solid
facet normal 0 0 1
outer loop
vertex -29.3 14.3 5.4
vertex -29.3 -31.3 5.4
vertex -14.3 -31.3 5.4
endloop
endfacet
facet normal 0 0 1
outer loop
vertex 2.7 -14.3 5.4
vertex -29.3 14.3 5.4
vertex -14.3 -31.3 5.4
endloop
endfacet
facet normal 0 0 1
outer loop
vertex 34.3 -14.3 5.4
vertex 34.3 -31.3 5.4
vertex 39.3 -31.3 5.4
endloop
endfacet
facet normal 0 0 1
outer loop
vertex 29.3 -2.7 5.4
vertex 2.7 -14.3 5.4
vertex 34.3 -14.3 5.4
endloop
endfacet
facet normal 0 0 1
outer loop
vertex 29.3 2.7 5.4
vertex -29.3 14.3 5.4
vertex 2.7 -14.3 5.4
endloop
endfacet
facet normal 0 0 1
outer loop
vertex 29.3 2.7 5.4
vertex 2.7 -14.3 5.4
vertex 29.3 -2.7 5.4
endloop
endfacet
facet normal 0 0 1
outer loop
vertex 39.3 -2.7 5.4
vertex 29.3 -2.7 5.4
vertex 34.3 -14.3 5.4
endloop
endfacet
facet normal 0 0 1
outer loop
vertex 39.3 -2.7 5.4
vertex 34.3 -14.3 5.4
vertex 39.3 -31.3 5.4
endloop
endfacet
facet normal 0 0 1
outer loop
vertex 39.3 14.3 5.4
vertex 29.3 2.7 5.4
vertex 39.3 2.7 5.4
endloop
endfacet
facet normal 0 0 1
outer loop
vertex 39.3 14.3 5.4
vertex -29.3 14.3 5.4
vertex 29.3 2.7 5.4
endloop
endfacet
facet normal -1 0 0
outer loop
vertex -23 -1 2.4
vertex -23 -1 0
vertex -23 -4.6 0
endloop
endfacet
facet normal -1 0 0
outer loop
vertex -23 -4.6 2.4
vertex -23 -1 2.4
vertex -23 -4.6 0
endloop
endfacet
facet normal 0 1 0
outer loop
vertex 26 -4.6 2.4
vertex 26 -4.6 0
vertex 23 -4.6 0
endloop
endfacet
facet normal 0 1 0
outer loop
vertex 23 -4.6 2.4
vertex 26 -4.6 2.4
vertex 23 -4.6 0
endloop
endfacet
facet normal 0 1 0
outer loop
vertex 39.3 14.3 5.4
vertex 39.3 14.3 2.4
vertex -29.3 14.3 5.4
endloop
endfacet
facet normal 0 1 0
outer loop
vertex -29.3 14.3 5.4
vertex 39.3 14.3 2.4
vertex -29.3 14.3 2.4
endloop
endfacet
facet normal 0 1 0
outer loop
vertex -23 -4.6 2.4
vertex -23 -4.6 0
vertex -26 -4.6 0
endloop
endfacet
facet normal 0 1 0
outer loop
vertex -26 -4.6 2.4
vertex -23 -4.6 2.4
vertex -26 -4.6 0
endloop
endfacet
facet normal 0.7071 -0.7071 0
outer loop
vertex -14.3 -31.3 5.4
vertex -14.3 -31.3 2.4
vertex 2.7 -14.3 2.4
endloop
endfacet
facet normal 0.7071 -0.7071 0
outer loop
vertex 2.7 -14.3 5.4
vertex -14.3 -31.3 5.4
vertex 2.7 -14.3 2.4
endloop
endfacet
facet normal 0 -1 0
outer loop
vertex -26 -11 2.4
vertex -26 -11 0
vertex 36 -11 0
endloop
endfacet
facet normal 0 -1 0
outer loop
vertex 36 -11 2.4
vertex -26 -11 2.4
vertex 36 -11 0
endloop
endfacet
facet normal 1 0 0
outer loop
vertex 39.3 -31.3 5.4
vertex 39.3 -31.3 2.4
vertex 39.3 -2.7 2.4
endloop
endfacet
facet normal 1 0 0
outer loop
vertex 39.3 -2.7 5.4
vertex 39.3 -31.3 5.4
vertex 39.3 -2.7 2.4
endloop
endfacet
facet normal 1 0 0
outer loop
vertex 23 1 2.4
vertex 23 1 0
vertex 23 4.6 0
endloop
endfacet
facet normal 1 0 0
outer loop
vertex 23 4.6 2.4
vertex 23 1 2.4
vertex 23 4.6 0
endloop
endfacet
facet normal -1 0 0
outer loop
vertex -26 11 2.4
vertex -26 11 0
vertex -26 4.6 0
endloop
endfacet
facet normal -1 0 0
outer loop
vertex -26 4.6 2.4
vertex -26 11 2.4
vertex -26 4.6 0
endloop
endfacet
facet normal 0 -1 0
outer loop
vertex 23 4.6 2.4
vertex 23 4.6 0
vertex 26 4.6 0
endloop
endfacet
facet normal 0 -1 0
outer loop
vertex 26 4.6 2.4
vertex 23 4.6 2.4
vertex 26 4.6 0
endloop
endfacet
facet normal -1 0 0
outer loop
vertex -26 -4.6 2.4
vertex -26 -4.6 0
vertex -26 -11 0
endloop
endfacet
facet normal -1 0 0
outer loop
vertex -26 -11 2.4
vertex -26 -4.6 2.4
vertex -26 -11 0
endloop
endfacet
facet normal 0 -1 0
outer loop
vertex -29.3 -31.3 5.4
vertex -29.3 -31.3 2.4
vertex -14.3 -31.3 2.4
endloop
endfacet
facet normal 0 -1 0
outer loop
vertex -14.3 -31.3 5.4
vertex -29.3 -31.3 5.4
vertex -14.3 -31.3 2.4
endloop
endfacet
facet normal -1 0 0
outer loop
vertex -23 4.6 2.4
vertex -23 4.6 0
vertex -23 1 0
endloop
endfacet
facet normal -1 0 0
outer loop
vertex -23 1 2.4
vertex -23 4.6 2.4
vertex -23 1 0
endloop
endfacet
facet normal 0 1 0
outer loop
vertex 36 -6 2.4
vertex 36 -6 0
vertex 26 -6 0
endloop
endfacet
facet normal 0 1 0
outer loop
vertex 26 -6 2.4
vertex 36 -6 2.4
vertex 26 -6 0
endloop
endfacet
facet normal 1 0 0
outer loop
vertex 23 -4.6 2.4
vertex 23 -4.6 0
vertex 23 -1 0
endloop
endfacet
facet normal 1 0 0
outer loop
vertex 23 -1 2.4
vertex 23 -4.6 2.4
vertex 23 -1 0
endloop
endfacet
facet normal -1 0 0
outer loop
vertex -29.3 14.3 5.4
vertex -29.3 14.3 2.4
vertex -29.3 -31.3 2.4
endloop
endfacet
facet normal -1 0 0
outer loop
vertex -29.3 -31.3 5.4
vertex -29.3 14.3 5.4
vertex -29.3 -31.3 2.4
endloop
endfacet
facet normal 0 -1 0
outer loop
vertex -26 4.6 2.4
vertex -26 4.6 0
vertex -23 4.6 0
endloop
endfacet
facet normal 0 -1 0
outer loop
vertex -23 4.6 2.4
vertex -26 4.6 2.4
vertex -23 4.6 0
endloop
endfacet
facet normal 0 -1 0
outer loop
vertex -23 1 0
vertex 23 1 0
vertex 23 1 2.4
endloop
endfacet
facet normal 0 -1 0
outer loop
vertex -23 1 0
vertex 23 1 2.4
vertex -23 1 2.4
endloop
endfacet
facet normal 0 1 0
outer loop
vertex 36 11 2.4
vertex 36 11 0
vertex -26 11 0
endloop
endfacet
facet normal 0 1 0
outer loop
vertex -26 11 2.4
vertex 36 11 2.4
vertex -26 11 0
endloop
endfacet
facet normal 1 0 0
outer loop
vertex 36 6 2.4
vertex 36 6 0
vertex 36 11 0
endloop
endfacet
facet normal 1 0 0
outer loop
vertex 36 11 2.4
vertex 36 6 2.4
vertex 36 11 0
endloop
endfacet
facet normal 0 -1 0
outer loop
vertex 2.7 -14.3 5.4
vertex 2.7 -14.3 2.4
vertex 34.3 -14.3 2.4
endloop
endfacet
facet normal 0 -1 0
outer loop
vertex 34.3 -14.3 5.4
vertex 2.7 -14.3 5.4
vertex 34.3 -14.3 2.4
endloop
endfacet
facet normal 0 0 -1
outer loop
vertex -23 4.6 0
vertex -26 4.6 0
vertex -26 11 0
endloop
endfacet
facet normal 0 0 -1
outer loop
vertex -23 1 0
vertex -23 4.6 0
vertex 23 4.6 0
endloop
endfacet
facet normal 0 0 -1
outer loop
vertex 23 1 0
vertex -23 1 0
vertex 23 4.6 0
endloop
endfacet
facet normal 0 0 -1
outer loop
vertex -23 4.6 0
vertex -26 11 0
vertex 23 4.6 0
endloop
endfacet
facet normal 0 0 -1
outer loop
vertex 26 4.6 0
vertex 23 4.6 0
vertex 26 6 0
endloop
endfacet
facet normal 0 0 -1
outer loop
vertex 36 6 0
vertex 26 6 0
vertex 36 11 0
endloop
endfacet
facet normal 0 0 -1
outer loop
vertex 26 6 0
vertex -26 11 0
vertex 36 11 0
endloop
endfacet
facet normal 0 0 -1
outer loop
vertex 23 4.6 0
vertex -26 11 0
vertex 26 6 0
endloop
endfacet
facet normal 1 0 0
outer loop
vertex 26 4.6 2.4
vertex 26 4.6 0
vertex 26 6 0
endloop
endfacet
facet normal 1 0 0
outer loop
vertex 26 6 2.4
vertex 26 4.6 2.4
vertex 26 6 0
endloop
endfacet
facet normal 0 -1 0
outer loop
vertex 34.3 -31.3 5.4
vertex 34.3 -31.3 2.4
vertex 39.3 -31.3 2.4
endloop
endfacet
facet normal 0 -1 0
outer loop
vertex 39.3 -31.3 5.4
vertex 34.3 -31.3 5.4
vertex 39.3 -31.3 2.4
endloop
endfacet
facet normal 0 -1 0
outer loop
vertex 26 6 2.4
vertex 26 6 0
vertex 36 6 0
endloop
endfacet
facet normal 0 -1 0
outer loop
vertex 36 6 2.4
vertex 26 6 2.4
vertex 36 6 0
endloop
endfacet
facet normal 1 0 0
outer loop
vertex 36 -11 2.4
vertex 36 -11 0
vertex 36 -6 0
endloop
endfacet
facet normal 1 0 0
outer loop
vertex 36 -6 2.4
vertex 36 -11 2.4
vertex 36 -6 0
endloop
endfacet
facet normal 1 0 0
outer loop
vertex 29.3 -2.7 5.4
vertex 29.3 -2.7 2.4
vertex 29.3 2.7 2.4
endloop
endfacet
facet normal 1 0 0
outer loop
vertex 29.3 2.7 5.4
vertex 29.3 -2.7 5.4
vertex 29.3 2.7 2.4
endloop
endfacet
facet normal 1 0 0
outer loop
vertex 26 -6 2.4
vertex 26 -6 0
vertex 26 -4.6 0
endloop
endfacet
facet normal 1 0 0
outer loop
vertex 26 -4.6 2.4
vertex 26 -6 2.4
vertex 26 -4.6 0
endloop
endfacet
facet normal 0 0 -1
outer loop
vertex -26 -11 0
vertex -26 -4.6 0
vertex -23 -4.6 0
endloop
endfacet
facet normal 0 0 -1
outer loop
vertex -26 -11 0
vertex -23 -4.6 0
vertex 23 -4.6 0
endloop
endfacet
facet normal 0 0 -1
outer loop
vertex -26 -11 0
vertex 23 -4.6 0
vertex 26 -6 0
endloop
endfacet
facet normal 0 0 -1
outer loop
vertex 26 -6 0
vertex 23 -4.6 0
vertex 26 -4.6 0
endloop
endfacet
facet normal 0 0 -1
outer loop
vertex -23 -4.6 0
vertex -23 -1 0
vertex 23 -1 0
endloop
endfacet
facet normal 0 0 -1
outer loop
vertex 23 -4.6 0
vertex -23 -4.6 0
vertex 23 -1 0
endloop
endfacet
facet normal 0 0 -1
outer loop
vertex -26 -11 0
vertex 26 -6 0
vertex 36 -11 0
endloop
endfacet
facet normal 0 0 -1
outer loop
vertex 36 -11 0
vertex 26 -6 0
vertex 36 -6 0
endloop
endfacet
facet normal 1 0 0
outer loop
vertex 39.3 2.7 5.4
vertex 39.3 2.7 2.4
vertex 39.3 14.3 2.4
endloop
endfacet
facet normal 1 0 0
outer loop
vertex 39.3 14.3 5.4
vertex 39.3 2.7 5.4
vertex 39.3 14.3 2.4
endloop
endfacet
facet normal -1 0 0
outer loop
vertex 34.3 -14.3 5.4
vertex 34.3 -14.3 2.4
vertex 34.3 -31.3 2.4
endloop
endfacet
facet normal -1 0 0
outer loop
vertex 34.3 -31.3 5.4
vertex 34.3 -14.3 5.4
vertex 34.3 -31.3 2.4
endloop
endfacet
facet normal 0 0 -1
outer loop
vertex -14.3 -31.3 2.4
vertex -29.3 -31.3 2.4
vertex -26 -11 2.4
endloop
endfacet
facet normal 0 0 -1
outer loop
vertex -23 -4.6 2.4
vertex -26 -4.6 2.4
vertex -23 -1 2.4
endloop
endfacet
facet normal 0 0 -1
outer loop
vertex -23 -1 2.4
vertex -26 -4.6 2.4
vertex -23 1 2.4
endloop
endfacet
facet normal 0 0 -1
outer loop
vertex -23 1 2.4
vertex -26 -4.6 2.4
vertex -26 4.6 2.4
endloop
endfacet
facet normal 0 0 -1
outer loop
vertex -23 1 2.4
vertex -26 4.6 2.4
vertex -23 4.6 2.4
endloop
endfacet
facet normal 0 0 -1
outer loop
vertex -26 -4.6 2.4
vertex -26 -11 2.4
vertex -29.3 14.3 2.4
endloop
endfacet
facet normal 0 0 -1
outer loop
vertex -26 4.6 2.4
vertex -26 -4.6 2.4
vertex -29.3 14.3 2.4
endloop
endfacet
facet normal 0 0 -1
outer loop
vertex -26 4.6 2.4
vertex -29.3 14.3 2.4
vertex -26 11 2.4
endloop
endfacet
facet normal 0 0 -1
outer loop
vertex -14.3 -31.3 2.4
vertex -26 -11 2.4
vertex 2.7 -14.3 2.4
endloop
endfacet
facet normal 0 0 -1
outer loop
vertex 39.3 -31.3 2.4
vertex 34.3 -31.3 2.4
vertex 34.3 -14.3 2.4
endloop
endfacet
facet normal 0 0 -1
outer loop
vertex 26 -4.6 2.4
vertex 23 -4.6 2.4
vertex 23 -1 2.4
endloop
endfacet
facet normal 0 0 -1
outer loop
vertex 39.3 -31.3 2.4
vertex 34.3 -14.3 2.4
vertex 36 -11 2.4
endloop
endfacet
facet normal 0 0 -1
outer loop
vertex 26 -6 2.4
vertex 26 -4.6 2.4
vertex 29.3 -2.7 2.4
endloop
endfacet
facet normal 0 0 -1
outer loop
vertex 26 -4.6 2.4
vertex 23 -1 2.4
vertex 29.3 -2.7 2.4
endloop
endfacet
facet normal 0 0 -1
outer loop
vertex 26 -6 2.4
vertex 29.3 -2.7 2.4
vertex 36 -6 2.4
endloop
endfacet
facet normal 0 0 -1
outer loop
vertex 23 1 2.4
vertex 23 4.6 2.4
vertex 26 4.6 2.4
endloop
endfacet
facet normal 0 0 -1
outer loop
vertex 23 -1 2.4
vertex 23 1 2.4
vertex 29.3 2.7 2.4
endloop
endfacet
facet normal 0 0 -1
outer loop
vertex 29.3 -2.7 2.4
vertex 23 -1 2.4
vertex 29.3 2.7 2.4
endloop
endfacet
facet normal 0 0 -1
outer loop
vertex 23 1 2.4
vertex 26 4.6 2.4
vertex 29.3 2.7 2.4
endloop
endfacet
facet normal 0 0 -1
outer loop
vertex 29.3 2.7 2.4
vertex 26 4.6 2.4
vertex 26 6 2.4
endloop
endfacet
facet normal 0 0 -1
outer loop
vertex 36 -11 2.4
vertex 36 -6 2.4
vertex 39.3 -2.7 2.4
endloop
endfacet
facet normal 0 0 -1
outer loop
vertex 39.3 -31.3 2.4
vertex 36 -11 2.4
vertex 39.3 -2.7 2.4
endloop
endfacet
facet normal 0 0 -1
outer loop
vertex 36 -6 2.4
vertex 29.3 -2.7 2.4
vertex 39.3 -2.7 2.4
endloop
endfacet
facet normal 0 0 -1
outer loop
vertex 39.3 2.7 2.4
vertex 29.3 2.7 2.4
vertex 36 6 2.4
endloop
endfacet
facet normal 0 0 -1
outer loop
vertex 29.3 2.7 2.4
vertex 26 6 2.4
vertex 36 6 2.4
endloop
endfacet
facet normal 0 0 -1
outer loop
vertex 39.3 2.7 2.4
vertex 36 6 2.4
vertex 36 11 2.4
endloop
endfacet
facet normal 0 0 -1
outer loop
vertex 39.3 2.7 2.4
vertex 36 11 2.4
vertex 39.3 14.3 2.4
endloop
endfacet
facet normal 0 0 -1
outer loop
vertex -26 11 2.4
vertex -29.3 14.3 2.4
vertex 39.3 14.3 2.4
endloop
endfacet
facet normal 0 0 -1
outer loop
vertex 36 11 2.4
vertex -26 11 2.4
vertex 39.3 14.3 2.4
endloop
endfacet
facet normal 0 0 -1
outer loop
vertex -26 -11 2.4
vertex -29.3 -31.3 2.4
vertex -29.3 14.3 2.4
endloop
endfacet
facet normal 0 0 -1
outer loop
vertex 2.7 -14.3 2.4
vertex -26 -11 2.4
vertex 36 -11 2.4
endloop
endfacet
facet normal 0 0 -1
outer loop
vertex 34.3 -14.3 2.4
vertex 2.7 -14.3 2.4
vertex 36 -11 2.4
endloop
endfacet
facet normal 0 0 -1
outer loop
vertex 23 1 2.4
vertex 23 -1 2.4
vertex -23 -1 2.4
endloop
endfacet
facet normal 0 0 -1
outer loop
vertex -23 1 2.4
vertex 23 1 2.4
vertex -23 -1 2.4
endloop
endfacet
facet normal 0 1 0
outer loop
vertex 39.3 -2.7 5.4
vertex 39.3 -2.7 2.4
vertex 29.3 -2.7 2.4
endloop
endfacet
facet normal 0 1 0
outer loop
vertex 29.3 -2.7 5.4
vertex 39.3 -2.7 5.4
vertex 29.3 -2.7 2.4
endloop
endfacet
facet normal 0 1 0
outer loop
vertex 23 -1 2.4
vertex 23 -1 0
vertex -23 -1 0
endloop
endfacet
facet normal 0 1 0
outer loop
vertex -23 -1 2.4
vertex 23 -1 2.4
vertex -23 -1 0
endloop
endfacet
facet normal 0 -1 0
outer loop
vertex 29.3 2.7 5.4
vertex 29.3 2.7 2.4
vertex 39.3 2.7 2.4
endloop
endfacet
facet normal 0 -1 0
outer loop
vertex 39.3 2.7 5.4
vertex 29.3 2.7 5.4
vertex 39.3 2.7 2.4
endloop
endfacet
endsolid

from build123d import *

# Parameters (mm, degrees)
BOSS_EXTRUDE2_DEPTH = 2.4
BOSS_EXTRUDE3_DEPTH = 3
SKETCH4_W           = 52
SKETCH4_H           = 2
CUT_EXTRUDE1_DEPTH  = 2.4


with BuildPart() as part:
    # Sketch1 → Boss-Extrude2 (new body)
    with BuildSketch(Plane.XY):
        Polygon((-26, -11), (36, -11), (36, -6), (26, -6), (26, -4.6), (23, -4.6), (23, -1), (26, -1), (26, 1), (23, 1), (23, 4.6), (26, 4.6), (26, 6), (36, 6), (36, 11), (-26, 11), (-26, 4.6), (-23, 4.6), (-23, 1), (-26, 1), (-26, -1), (-23, -1), (-23, -4.6), (-26, -4.6), align=None)
    extrude(amount=BOSS_EXTRUDE2_DEPTH)

    # Sketch3 → Boss-Extrude3 (add)
    with BuildSketch(Plane.XY.offset(2.4)):
        Polygon((-29.3, -14.3), (-29.3, -31.3), (-14.3, -31.3), (2.7, -14.3), (34.3, -14.3), (34.3, -31.3), (39.3, -31.3), (39.3, -14.3), (39.3, -2.7), (29.3, -2.7), (29.3, 2.7), (39.3, 2.7), (39.3, 14.3), (29.3, 14.3), (-29.3, 14.3), align=None)
    extrude(amount=BOSS_EXTRUDE3_DEPTH)

    # Sketch4 → Cut-Extrude1 (cut)
    with BuildSketch(Plane(origin=(0, 0, 0), x_dir=(-1, 0, 0), z_dir=(0, 0, -1))):
        Rectangle(SKETCH4_W, SKETCH4_H)
    extrude(amount=-CUT_EXTRUDE1_DEPTH, mode=Mode.SUBTRACT)


solid = part.part
